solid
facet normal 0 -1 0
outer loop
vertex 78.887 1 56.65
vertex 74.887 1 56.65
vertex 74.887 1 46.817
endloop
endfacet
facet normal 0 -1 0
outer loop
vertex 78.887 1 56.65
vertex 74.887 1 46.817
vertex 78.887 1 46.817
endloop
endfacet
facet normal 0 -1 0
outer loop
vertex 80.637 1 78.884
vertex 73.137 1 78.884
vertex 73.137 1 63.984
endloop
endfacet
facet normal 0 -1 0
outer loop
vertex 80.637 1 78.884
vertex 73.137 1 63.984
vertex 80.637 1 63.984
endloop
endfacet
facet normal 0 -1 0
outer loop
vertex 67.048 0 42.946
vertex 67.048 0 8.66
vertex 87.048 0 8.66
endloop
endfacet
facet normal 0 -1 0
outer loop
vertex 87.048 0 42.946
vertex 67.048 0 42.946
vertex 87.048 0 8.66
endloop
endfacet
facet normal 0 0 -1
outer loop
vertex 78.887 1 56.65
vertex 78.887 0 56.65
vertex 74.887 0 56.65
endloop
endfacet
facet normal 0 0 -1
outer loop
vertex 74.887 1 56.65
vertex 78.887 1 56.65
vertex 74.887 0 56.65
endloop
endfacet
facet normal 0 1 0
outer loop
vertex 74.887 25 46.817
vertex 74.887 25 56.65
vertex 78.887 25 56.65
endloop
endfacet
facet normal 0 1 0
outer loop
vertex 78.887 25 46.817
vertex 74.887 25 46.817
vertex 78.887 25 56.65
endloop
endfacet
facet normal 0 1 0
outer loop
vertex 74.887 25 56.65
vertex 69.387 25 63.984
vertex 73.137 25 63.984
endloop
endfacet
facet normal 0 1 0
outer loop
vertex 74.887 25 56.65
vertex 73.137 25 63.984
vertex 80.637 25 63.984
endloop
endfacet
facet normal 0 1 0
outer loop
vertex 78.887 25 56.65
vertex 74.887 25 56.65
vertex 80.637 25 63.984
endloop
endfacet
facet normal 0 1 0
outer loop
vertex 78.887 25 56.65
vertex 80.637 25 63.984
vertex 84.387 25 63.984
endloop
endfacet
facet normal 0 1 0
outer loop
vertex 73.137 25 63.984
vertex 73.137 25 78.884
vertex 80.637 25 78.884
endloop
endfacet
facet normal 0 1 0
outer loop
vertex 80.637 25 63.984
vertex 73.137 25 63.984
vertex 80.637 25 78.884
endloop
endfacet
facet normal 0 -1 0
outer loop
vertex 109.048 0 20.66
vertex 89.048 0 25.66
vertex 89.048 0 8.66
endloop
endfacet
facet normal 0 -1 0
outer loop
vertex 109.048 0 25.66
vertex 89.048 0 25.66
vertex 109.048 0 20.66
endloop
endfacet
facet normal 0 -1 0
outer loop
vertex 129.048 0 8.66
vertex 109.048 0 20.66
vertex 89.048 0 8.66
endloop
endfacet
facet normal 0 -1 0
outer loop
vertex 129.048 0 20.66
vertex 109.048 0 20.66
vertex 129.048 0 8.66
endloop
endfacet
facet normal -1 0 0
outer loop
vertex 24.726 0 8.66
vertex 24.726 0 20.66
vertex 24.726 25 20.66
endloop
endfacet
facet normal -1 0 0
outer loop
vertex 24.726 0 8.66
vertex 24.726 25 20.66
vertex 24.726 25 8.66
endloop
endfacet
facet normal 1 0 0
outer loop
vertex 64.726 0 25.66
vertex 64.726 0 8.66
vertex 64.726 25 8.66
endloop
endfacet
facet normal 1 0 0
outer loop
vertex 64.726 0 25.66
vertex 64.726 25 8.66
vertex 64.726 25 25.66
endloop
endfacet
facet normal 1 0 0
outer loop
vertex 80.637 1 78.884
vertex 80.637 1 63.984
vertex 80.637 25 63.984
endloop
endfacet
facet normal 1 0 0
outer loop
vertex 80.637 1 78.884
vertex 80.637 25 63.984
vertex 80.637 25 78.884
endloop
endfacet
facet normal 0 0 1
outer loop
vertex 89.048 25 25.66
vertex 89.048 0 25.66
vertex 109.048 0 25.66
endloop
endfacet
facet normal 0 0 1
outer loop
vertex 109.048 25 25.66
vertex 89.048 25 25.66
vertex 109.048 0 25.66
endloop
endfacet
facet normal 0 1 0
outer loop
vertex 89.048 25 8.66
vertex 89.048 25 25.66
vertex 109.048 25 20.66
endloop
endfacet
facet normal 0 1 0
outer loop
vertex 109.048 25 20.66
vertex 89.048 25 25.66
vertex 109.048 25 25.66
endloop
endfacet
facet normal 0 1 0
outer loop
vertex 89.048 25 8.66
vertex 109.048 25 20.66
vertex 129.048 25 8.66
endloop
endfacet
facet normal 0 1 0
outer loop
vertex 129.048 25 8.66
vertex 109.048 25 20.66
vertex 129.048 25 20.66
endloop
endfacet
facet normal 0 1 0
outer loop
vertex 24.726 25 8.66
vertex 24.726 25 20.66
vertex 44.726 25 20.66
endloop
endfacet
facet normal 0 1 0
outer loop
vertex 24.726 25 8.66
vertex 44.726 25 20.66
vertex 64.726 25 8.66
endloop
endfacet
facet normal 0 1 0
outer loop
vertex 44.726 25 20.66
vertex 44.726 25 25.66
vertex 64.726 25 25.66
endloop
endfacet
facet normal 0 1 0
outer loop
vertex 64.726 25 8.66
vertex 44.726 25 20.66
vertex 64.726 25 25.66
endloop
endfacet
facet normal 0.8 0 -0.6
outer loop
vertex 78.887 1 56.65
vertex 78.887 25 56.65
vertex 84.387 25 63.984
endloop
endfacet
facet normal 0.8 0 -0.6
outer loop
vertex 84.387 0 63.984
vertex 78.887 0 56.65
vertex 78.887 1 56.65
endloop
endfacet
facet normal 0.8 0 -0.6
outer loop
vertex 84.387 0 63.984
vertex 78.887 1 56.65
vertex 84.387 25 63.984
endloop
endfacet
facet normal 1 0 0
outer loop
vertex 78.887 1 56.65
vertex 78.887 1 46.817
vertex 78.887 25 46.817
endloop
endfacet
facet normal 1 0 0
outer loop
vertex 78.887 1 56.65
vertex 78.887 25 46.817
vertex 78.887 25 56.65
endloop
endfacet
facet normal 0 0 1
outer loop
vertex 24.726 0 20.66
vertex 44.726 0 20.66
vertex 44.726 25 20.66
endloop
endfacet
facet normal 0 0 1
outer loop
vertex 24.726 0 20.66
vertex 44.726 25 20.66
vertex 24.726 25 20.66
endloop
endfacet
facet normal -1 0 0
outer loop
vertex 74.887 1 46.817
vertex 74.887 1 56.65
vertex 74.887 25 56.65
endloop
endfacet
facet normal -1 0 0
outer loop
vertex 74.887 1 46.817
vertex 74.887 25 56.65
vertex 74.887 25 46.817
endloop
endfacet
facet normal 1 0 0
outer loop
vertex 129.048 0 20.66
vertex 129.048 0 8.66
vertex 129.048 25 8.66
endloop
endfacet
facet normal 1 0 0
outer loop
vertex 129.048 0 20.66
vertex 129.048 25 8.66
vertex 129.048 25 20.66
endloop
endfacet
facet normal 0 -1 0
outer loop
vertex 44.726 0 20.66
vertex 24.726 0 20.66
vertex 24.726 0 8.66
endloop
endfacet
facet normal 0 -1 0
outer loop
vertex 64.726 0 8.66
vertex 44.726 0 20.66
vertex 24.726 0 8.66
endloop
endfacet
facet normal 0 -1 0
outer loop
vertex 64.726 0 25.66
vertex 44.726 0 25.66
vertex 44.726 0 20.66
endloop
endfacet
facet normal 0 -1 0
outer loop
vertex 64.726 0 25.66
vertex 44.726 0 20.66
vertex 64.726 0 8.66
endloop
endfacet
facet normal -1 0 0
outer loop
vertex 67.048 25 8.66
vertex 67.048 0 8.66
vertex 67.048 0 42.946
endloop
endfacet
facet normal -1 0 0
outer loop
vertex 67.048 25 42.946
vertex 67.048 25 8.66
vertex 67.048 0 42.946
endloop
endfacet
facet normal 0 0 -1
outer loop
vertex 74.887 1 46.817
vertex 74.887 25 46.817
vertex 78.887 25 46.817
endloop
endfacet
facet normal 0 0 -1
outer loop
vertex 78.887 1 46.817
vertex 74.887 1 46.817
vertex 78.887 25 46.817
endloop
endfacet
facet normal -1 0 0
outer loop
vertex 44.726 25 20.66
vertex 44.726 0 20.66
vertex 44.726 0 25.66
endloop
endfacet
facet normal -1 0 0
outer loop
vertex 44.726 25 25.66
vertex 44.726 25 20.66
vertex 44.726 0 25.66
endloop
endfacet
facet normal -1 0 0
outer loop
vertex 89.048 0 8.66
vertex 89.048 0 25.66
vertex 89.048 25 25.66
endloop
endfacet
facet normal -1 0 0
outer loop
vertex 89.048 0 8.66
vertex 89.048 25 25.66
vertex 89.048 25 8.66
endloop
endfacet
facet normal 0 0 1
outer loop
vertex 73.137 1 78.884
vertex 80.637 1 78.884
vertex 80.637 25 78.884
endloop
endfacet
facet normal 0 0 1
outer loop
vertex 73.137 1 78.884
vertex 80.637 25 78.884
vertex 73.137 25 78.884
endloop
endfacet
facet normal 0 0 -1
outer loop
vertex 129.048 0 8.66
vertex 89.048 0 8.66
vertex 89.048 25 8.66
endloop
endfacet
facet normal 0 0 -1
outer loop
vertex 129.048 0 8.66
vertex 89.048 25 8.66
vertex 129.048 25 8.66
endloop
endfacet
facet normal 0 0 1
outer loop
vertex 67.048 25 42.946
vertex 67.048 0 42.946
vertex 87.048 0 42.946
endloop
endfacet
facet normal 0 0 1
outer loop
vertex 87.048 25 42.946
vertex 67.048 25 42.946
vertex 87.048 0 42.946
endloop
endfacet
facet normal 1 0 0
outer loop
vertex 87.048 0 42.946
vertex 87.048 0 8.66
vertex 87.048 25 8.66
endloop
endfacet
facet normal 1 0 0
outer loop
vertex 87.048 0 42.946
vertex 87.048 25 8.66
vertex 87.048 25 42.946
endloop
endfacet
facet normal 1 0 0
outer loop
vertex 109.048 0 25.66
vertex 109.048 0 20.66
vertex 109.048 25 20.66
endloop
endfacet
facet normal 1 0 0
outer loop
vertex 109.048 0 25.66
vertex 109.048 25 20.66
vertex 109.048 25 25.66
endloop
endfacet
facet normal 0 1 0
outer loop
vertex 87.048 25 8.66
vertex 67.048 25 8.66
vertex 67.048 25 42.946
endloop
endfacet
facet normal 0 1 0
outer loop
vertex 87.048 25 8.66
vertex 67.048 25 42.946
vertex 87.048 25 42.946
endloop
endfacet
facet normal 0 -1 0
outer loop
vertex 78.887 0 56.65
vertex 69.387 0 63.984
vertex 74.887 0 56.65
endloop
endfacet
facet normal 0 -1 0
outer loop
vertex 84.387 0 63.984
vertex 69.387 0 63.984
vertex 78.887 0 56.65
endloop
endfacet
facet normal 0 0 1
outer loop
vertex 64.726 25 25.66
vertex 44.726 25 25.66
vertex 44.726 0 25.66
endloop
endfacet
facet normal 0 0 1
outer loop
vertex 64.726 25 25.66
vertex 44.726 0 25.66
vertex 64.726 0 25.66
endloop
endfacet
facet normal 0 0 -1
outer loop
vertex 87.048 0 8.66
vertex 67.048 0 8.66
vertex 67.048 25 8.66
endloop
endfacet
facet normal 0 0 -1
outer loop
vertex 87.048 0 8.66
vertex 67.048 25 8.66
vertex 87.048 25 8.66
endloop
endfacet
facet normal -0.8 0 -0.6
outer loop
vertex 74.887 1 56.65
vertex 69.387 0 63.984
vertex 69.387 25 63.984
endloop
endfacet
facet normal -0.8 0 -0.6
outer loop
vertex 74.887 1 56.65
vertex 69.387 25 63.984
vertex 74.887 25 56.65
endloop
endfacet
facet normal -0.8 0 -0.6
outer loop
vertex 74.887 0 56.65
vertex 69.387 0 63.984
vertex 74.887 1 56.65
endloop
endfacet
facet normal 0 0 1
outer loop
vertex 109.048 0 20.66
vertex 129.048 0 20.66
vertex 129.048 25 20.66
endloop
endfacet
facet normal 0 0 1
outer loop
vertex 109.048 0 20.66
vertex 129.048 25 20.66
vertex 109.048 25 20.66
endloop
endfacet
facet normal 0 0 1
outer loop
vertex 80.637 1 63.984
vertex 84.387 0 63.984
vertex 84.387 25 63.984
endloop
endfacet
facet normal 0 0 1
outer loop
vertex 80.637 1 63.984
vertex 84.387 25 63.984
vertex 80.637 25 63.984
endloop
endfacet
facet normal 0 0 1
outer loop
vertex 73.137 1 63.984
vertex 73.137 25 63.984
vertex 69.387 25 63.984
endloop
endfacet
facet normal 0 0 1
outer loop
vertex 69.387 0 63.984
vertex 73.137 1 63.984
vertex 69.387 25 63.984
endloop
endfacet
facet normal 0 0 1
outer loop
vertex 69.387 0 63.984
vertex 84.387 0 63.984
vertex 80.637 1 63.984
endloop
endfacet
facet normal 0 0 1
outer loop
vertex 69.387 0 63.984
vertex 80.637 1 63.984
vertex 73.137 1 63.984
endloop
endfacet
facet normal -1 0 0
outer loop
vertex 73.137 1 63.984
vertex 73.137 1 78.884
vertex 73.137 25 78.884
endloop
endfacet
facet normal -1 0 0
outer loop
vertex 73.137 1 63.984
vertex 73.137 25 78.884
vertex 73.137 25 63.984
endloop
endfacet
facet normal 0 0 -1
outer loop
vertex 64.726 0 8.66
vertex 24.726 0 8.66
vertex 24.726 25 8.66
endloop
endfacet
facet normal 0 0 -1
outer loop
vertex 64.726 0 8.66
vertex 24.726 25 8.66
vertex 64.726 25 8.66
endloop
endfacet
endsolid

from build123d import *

# Parameters (mm, degrees)
F0_W     = 20
F0_H     = 34.286152
F0_H_2   = 5
F1_DEPTH = 25
F2_DEPTH = 1


with BuildPart() as f1:
    # F0 (on Front) → F1 (new body)
    with BuildSketch(Plane.XZ):
        with Locations((77.048486, 25.803229)):
            Rectangle(F0_W, F0_H)
        Polygon((89.048486, 20.660153), (89.048486, 8.660153), (129.048486, 8.660153), (129.048486, 20.660153), (109.048486, 20.660153), align=None)
        with Locations((99.048486, 23.160153)):
            Rectangle(F0_W, F0_H_2)
        Polygon((78.887447, 56.650452), (84.387447, 63.983785), (80.637447, 63.983785), (76.887447, 63.983785), (73.137447, 63.983785), (69.387447, 63.983785), (74.887447, 56.650452), align=None)
        Polygon((78.887447, 51.150424), (78.887447, 56.650452), (74.887447, 56.650452), (74.887447, 51.150424), (74.887447, 46.817146), (78.887447, 46.817146), align=None)
        Polygon((76.887447, 63.983785), (80.637447, 63.983785), (80.637447, 78.883611), (73.137447, 78.883611), (73.137447, 63.983785), align=None)
        with Locations((54.726408, 23.160153)):
            Rectangle(F0_W, F0_H_2)
        Polygon((64.726408, 20.660153), (44.726408, 20.660153), (24.726408, 20.660153), (24.726408, 8.660153), (64.726408, 8.660153), align=None)
    extrude(amount=-F1_DEPTH)

    # F0 (on Front) → F2 (cut)
    with BuildSketch(Plane.XZ):
        Polygon((78.887447, 51.150424), (78.887447, 56.650452), (74.887447, 56.650452), (74.887447, 51.150424), (74.887447, 46.817146), (78.887447, 46.817146), align=None)
        Polygon((76.887447, 63.983785), (80.637447, 63.983785), (80.637447, 78.883611), (73.137447, 78.883611), (73.137447, 63.983785), align=None)
    extrude(amount=-F2_DEPTH, mode=Mode.SUBTRACT)


solid = f1.part
